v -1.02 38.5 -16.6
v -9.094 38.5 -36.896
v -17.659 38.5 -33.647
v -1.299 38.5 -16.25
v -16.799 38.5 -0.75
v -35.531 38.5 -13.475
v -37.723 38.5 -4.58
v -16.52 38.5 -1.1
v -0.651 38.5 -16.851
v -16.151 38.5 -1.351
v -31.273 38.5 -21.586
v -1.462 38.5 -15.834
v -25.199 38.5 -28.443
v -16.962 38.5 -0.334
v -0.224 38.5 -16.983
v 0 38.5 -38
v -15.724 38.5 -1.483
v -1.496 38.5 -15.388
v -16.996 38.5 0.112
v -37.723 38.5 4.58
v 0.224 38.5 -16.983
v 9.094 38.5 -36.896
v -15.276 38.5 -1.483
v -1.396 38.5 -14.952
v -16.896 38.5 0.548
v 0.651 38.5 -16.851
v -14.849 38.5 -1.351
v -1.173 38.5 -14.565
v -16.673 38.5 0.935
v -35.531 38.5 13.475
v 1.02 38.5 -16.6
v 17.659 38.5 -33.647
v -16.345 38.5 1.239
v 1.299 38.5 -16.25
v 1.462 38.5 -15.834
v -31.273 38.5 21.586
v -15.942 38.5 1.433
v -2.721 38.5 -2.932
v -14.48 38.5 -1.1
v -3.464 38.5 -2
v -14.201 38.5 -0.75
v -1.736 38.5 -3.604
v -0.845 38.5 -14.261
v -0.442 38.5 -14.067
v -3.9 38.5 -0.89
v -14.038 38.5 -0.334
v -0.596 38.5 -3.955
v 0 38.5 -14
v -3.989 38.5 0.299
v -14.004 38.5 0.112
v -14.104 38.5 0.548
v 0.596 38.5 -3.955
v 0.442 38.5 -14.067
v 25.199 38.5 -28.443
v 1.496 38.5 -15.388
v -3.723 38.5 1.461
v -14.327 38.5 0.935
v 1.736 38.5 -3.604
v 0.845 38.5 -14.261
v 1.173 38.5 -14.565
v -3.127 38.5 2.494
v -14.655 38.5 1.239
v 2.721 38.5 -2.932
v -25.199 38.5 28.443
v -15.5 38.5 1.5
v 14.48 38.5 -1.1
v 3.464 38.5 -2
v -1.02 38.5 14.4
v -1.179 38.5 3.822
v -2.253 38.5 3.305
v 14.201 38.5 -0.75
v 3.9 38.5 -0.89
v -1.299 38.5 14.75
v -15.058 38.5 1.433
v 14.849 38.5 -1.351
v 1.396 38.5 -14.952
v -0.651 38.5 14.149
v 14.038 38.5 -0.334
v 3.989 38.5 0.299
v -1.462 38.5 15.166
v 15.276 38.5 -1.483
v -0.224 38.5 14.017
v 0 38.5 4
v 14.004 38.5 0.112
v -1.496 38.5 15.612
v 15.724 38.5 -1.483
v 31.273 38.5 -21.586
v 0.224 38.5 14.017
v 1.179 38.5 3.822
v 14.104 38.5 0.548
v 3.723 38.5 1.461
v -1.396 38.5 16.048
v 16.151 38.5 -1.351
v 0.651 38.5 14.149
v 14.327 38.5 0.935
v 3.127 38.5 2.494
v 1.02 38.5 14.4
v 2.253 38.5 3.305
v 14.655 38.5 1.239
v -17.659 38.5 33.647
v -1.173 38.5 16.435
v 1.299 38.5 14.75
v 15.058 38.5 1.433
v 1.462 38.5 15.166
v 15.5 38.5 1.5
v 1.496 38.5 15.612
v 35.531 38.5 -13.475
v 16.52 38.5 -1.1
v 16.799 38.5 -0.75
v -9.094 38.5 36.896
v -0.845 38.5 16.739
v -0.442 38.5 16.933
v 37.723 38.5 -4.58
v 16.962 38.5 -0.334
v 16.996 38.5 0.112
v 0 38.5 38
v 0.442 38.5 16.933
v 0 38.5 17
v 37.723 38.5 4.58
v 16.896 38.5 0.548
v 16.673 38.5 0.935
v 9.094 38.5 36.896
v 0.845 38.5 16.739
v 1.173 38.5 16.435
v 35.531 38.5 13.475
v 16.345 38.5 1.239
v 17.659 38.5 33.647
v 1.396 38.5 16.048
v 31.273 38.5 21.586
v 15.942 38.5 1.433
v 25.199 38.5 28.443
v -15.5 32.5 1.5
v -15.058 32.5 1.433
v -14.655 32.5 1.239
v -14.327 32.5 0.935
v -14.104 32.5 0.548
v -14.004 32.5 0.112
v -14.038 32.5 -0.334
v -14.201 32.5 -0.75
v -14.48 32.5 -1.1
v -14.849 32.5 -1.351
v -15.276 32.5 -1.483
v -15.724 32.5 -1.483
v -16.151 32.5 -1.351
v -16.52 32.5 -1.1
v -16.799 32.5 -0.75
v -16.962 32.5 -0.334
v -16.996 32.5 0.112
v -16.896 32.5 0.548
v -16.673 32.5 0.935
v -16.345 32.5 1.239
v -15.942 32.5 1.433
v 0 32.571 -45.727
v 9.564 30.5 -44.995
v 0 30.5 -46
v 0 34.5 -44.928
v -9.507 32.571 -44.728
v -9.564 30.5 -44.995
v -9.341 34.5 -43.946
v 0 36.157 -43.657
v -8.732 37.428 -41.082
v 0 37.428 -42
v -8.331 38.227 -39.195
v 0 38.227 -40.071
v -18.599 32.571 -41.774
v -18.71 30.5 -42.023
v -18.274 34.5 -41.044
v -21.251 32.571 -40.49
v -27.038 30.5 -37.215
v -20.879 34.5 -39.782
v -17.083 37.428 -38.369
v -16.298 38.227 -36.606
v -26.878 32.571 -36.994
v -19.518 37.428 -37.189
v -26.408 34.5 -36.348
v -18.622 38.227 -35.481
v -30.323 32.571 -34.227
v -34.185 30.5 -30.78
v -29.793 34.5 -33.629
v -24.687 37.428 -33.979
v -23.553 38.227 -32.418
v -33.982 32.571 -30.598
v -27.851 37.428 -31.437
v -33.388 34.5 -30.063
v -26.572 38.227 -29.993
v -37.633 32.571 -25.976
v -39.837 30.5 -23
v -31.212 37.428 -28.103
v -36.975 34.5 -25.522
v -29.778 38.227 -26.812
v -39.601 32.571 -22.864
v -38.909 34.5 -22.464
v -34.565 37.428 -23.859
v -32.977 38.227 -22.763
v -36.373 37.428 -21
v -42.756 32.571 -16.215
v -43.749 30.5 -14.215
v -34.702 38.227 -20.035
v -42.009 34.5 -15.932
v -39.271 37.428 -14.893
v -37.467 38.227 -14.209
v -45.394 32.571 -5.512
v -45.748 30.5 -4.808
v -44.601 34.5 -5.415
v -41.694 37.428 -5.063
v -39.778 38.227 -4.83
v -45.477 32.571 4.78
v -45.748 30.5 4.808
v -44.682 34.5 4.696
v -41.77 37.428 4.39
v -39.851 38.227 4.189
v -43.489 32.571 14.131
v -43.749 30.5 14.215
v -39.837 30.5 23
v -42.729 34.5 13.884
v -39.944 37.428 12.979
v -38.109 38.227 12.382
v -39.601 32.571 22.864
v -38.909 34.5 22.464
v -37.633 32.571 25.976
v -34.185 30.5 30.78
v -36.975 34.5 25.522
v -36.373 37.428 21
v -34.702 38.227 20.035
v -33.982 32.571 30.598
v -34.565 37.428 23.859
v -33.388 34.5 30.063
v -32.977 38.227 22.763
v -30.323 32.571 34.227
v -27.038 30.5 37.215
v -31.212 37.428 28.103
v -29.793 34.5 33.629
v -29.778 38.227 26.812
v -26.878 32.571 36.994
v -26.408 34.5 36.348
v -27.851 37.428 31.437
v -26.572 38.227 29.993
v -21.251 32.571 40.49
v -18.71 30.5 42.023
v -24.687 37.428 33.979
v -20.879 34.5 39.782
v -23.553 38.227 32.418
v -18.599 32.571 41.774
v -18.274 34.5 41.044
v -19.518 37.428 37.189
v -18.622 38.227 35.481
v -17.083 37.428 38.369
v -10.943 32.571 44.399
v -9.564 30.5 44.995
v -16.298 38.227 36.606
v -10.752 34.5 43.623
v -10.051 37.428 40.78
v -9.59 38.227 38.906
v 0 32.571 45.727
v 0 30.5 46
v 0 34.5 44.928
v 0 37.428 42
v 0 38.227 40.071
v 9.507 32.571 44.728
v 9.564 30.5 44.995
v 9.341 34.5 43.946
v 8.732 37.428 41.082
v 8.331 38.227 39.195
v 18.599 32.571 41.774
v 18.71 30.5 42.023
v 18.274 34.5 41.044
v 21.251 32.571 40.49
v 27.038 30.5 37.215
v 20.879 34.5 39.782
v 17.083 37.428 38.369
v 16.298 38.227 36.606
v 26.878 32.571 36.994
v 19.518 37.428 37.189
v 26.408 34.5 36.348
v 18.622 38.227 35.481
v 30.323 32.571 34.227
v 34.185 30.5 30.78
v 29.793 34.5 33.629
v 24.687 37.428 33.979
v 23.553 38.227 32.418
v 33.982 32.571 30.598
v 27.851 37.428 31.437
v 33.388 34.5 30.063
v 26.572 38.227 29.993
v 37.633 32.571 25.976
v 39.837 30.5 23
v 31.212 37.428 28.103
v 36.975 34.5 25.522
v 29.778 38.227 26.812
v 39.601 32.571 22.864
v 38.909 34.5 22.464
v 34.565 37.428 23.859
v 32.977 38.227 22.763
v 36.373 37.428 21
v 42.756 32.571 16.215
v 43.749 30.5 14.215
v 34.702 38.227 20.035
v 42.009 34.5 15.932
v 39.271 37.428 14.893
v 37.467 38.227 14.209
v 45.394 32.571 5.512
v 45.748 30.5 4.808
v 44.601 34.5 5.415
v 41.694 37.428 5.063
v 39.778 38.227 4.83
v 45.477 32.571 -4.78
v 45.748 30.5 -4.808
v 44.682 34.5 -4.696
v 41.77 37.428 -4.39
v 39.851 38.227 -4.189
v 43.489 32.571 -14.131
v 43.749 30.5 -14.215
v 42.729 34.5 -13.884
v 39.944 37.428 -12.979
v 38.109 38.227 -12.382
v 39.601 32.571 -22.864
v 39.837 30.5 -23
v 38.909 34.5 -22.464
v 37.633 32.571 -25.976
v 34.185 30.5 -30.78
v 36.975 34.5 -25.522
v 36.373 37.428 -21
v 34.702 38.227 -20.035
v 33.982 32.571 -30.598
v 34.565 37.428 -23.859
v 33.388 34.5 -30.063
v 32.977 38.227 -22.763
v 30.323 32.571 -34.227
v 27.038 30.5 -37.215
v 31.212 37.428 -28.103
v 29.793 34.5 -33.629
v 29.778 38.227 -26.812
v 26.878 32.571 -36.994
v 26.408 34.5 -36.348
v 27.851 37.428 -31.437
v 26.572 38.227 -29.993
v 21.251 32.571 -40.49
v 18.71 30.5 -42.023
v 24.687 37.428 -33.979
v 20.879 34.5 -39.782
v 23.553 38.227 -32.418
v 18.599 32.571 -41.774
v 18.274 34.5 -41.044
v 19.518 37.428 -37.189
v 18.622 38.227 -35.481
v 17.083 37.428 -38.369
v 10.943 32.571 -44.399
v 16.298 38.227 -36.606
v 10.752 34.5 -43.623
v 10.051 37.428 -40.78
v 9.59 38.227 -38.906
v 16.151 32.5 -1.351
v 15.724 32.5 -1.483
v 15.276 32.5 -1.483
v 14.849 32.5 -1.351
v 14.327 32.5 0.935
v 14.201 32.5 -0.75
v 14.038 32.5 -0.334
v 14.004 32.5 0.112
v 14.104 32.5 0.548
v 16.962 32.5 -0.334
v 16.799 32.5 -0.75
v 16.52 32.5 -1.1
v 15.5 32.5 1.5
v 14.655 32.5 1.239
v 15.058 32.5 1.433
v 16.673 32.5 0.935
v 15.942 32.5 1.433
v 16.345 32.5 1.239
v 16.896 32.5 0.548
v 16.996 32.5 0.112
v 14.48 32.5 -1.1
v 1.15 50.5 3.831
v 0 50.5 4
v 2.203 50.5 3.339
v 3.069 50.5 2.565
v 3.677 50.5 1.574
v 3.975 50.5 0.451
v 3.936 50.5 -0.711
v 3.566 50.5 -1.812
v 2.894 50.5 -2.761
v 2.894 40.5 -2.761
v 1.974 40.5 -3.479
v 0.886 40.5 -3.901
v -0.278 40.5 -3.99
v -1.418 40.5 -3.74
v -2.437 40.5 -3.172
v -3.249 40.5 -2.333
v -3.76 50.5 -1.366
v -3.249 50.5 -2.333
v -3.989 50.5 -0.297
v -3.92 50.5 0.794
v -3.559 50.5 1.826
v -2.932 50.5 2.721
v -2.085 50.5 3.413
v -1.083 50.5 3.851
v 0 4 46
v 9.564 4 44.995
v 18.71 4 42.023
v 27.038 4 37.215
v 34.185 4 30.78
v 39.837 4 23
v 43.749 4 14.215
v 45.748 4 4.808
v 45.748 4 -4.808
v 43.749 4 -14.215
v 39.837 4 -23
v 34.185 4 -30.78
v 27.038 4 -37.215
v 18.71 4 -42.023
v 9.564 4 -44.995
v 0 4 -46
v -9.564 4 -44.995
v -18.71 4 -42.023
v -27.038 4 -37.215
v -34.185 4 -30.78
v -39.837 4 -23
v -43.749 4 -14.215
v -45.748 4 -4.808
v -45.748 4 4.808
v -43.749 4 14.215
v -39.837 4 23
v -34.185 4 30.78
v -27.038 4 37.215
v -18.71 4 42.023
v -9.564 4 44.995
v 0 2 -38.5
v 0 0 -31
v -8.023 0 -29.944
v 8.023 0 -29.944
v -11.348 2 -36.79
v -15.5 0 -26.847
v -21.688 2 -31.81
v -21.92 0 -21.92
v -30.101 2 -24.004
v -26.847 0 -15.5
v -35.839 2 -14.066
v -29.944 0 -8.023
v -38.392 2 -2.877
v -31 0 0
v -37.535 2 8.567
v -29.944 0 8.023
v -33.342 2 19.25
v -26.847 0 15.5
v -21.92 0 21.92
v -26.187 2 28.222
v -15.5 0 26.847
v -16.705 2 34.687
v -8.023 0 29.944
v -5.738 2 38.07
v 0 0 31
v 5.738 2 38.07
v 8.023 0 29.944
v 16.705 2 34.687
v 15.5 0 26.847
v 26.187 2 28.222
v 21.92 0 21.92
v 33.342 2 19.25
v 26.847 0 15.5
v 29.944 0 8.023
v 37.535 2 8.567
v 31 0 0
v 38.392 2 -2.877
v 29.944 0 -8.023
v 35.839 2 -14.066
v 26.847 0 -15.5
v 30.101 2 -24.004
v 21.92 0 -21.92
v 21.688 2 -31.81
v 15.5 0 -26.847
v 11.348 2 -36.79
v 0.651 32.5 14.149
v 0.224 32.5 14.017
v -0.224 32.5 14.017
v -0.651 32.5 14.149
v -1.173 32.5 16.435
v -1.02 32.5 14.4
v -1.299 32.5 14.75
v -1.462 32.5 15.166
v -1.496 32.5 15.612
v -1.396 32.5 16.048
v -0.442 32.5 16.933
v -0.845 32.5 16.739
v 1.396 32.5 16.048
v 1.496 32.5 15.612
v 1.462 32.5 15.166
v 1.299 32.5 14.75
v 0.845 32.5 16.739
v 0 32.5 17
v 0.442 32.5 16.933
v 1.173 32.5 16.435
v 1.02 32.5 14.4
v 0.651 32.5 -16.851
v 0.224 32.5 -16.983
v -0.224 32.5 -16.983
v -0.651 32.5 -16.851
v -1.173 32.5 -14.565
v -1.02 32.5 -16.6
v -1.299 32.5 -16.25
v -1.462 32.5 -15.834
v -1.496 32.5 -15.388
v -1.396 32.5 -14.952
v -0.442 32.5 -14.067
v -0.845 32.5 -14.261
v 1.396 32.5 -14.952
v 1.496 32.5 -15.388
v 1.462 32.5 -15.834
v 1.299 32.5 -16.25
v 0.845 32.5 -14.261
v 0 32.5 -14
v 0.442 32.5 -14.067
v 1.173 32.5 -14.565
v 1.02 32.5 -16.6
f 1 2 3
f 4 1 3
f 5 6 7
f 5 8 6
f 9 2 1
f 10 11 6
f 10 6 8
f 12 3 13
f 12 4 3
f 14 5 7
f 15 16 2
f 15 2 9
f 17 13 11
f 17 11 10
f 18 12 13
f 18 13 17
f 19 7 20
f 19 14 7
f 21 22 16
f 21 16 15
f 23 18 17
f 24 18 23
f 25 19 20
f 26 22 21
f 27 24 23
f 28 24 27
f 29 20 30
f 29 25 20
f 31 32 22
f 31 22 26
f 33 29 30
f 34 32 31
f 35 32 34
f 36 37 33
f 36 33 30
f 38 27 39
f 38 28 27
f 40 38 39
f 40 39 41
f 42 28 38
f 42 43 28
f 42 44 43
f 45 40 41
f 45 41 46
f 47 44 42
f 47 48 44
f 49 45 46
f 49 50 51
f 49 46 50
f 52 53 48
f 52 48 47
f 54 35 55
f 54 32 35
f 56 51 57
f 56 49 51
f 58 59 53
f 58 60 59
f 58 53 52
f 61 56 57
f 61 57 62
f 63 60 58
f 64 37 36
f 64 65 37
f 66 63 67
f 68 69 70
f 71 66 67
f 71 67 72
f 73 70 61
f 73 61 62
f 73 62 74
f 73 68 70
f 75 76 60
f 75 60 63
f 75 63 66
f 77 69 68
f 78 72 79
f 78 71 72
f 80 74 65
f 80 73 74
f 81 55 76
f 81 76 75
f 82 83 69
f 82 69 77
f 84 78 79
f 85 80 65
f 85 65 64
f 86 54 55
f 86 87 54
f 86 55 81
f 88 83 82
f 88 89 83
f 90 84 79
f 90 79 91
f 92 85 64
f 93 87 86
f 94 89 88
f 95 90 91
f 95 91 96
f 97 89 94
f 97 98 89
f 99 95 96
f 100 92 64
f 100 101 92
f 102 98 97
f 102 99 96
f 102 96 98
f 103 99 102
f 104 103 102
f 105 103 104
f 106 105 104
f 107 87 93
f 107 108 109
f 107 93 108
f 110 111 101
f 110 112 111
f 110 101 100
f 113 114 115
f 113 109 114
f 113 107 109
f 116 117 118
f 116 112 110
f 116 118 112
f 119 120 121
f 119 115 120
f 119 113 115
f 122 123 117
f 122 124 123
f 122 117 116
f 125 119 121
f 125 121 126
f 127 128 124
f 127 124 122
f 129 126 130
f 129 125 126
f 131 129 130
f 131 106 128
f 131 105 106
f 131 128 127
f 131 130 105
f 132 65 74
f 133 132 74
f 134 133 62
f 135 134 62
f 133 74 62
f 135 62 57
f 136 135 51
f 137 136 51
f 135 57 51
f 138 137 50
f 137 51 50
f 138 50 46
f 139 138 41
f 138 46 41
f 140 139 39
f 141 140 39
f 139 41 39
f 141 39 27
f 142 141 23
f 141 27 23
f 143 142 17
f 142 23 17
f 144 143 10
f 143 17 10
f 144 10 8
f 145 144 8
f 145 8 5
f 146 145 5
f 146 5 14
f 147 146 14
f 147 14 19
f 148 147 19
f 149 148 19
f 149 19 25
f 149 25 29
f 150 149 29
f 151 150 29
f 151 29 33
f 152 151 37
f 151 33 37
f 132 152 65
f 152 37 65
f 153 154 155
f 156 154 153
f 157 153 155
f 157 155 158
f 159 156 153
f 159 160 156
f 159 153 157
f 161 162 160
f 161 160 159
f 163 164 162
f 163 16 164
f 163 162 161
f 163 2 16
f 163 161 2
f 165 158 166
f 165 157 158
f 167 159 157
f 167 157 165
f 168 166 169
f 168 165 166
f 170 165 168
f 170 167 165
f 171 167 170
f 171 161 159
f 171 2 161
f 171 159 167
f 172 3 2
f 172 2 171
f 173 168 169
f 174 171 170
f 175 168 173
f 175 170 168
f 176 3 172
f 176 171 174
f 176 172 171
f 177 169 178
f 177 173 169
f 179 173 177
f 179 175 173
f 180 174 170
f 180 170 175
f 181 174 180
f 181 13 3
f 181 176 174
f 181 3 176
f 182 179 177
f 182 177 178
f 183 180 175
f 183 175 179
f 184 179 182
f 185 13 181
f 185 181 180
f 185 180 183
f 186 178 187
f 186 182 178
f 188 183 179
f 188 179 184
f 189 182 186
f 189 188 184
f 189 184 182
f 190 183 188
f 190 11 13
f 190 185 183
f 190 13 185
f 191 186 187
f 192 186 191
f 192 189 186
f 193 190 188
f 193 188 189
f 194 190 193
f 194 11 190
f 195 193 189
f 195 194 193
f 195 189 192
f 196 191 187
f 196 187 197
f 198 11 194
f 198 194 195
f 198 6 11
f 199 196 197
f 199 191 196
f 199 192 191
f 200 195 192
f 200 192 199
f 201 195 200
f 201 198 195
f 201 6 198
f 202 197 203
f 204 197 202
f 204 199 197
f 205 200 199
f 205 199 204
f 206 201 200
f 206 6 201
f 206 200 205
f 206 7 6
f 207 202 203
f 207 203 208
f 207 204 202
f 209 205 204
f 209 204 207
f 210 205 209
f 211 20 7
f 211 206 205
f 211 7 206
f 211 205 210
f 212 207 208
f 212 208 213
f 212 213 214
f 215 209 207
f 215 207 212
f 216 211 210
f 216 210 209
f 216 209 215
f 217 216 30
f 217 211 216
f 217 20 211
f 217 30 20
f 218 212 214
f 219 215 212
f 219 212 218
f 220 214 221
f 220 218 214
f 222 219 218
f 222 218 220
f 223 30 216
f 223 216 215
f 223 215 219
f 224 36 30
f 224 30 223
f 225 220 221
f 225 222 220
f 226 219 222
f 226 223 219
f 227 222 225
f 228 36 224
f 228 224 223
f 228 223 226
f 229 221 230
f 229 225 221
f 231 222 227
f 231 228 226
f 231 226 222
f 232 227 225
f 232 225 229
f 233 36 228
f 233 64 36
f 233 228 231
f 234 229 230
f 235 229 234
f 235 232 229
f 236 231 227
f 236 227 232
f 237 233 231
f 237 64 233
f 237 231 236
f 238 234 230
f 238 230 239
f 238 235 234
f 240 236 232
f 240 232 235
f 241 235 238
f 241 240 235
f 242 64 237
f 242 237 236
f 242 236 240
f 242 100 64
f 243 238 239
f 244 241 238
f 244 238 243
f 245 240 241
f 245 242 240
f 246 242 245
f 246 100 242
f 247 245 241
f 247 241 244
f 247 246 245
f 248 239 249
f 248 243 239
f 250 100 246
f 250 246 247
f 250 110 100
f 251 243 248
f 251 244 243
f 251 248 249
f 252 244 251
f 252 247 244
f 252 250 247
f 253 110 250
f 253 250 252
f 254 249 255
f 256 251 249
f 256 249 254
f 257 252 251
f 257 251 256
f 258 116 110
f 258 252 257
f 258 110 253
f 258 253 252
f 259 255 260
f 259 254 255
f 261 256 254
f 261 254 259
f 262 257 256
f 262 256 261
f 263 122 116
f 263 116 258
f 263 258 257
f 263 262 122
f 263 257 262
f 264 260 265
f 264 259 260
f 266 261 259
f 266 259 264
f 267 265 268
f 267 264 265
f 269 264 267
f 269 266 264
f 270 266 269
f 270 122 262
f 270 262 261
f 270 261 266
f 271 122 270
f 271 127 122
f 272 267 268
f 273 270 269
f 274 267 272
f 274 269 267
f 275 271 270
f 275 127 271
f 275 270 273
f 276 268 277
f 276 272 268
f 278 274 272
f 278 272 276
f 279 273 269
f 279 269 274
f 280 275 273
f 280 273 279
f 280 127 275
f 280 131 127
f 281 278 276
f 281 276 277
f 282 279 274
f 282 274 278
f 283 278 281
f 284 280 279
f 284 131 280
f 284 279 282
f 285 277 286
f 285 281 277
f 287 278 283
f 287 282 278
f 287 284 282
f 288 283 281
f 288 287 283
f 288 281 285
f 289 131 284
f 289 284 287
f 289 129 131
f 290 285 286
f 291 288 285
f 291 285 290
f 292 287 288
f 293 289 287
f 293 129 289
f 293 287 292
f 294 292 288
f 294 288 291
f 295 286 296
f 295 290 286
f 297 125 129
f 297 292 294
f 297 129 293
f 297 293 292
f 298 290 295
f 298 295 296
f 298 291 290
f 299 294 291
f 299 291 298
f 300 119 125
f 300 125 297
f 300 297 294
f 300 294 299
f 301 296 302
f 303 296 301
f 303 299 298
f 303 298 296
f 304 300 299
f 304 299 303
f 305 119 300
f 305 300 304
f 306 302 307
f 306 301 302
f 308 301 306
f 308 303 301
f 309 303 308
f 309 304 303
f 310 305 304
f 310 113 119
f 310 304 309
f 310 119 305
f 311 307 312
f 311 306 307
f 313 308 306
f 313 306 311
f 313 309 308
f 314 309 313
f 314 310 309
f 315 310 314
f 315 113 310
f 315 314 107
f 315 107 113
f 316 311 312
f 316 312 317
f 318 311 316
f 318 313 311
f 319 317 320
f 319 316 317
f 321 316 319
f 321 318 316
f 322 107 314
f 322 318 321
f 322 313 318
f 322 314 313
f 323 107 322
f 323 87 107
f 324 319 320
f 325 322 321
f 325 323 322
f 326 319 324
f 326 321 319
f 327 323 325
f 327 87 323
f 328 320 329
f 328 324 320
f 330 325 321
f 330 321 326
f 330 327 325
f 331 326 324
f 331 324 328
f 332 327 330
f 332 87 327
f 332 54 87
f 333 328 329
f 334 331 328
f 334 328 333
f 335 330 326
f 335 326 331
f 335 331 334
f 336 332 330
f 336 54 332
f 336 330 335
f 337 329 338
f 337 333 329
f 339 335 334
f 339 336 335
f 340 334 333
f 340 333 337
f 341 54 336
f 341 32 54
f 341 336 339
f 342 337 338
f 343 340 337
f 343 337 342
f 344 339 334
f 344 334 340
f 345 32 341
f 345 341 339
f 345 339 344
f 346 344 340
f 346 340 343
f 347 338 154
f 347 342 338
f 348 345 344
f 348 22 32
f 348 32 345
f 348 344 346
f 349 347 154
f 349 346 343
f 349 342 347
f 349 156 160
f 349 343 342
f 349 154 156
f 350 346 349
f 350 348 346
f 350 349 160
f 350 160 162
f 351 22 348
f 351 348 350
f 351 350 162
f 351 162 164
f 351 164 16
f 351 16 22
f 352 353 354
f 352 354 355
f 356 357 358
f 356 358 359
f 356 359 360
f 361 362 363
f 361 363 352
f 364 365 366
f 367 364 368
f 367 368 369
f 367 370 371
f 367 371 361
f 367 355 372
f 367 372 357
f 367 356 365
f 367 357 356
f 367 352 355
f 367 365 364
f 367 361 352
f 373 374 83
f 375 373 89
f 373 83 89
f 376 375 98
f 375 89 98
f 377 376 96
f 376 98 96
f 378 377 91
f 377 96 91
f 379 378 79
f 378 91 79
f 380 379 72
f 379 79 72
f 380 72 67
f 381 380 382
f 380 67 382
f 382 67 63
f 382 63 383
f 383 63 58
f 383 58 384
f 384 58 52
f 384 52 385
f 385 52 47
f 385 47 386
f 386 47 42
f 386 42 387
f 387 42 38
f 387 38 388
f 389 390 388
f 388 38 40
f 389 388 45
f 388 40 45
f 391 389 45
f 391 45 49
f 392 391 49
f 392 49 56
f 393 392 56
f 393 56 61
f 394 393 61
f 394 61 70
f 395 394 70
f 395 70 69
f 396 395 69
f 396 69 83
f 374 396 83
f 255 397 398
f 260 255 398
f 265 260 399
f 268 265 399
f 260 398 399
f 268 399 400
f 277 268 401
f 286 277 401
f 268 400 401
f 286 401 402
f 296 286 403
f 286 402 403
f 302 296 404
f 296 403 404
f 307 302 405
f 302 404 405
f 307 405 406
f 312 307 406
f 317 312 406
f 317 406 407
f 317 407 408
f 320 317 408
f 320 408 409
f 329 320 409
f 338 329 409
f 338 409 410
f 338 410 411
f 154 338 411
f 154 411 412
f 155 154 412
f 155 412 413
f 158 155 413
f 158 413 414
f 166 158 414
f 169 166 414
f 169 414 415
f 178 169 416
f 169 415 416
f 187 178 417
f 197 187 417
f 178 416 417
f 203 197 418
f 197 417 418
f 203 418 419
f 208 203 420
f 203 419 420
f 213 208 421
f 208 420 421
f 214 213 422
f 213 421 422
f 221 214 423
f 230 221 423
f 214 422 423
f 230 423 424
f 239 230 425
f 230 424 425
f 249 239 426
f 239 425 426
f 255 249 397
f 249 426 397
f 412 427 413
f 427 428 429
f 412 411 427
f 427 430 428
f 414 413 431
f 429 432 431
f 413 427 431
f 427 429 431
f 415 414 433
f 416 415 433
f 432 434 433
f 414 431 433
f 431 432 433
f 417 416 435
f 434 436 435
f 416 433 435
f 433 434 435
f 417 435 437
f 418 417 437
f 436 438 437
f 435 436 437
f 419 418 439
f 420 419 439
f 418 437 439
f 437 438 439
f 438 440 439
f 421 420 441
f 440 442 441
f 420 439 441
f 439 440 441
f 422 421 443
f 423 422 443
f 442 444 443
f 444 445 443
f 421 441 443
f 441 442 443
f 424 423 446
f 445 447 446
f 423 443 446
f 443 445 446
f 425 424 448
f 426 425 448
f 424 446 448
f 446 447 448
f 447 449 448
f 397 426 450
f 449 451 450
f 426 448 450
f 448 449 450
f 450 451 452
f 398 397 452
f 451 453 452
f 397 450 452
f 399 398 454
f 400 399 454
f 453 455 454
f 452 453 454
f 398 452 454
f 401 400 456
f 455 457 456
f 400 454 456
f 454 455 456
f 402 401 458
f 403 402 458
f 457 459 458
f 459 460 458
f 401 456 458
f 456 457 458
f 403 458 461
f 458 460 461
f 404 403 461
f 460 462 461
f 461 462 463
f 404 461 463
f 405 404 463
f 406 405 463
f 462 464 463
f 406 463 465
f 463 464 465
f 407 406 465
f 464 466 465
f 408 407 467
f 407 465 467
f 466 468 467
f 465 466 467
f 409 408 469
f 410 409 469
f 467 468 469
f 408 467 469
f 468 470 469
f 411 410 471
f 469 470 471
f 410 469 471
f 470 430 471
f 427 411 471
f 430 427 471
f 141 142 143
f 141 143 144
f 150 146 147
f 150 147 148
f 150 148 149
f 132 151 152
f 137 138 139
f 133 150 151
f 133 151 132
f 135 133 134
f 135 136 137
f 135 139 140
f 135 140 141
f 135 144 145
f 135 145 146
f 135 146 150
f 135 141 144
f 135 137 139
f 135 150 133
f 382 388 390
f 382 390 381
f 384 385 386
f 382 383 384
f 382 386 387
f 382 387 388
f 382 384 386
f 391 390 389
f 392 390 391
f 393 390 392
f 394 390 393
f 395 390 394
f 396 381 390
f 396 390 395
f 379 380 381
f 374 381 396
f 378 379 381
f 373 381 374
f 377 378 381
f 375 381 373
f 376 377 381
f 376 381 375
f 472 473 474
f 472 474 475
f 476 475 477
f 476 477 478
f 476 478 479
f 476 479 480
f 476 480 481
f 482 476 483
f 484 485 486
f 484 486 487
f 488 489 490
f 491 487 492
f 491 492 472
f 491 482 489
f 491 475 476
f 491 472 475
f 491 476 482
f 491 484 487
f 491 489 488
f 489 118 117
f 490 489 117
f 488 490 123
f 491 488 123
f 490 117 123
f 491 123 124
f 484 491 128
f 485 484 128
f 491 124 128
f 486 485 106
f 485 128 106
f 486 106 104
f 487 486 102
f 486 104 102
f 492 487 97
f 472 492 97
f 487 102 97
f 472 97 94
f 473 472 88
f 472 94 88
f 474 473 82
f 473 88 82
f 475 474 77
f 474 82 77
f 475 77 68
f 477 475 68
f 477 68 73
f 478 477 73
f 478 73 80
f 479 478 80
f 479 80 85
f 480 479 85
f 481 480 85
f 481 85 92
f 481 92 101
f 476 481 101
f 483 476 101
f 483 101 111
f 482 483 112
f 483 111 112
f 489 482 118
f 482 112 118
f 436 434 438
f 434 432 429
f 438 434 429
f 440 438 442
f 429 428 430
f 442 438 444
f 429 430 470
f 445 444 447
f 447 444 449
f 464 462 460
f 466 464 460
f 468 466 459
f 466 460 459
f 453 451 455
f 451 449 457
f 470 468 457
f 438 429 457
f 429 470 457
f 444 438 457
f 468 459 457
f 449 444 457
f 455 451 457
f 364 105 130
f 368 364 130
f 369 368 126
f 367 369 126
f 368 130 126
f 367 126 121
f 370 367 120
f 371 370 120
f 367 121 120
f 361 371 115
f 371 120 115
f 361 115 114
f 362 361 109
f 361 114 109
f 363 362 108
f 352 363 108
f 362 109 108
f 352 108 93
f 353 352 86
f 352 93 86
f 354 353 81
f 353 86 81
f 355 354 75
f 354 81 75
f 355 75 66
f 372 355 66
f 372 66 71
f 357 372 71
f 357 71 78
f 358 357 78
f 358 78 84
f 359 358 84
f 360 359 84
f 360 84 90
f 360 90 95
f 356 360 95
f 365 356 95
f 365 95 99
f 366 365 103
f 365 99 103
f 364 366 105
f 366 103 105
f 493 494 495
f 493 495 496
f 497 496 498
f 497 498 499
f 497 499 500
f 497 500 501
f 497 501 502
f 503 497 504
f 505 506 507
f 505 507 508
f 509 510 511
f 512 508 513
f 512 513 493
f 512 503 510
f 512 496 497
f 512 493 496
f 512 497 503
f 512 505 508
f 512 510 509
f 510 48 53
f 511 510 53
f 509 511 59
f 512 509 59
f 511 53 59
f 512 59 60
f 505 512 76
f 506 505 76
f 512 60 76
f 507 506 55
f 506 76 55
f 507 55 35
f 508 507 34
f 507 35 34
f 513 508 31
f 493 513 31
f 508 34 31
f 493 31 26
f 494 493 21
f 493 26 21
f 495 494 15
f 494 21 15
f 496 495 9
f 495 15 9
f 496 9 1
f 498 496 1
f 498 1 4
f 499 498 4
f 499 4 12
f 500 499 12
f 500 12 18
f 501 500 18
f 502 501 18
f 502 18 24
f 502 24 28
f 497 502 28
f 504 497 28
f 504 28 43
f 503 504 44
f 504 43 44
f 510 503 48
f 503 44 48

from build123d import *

# Parameters (mm, degrees)
SKETCH1_R           = 46
BOSS_EXTRUDE1_DEPTH = 38.5
SKETCH4_R           = 4
BOSS_EXTRUDE2_DEPTH = 12
SKETCH5_R           = 1.5
CUT_EXTRUDE1_DEPTH  = 6
CUT_EXTRUDE2_START  = -10
CUT_EXTRUDE2_DEPTH  = 10


with BuildPart() as part:
    # Sketch1 → Boss-Extrude1 (new body)
    with BuildSketch(Plane(origin=(0, 0, 0), x_dir=(1, 0, 0), z_dir=(0, 1, 0))):
        with Locations(Location((0, 0, 0), (0, 0, 270))):
            Circle(SKETCH1_R)
    extrude(amount=BOSS_EXTRUDE1_DEPTH)

    # Sketch2 → Cut-Revolve1 (revolve, cut)
    with BuildSketch(Plane.XY, mode=Mode.PRIVATE) as cut_revolve1_sk:
        with BuildLine():
            Line((-46, 38.5), (-46, 30.5))
            ThreePointArc((-46, 30.5), (-43.656854249, 36.156854249), (-38, 38.5))
            Line((-38, 38.5), (-46, 38.5))
        make_face()
    revolve(cut_revolve1_sk.sketch.rotate(Axis((0, 0, 0), (0, 1, 0)), 270), axis=Axis((0, 0, 0), (0, 1, 0)), mode=Mode.SUBTRACT)

    # Sketch3 → Cut-Revolve2 (revolve, cut)
    with BuildSketch(Plane.XY, mode=Mode.PRIVATE) as cut_revolve2_sk:
        Polygon((-46, 0), (-46, 4), (-31, 0), align=None)
    revolve(cut_revolve2_sk.sketch.rotate(Axis((0, 0, 0), (0, 1, 0)), 270), axis=Axis((0, 0, 0), (0, 1, 0)), mode=Mode.SUBTRACT)

    # Sketch4 → Boss-Extrude2 (add)
    with BuildSketch(Plane(origin=(0, 38.5, 0), x_dir=(1, 0, 0), z_dir=(0, 1, 0))):
        with Locations(Location((0, 0, 0), (0, 0, 270))):
            Circle(SKETCH4_R)
    extrude(amount=BOSS_EXTRUDE2_DEPTH)

    # Sketch5 → Cut-Extrude1 (cut)
    with BuildSketch(Plane(origin=(0, 38.5, 0), x_dir=(1, 0, 0), z_dir=(0, 1, 0))):
        with Locations(Location((-15.5, 0, 0), (0, 0, 270))):
            Circle(SKETCH5_R)
        with Locations(Location((0, 15.5, 0), (0, 0, 270))):
            Circle(SKETCH5_R)
        with Locations(Location((15.5, 0, 0), (0, 0, 270))):
            Circle(SKETCH5_R)
        with Locations(Location((0, -15.5, 0), (0, 0, 270))):
            Circle(SKETCH5_R)
    extrude(amount=-CUT_EXTRUDE1_DEPTH, mode=Mode.SUBTRACT)

    # Sketch6 → Cut-Extrude2 (cut)
    with BuildSketch(Plane(origin=(0, 50.5, 0), x_dir=(1, 0, 0), z_dir=(0, 1, 0)).offset(CUT_EXTRUDE2_START)):
        with BuildLine():
            Line((-3.249189343, 2.332974199), (2.894455289, 2.760820273))
            ThreePointArc((2.894455289, 2.760820273), (-0.277888697, 3.990335559), (-3.249189343, 2.332974199))
        make_face()
    extrude(amount=CUT_EXTRUDE2_DEPTH, mode=Mode.SUBTRACT)


solid = part.part
